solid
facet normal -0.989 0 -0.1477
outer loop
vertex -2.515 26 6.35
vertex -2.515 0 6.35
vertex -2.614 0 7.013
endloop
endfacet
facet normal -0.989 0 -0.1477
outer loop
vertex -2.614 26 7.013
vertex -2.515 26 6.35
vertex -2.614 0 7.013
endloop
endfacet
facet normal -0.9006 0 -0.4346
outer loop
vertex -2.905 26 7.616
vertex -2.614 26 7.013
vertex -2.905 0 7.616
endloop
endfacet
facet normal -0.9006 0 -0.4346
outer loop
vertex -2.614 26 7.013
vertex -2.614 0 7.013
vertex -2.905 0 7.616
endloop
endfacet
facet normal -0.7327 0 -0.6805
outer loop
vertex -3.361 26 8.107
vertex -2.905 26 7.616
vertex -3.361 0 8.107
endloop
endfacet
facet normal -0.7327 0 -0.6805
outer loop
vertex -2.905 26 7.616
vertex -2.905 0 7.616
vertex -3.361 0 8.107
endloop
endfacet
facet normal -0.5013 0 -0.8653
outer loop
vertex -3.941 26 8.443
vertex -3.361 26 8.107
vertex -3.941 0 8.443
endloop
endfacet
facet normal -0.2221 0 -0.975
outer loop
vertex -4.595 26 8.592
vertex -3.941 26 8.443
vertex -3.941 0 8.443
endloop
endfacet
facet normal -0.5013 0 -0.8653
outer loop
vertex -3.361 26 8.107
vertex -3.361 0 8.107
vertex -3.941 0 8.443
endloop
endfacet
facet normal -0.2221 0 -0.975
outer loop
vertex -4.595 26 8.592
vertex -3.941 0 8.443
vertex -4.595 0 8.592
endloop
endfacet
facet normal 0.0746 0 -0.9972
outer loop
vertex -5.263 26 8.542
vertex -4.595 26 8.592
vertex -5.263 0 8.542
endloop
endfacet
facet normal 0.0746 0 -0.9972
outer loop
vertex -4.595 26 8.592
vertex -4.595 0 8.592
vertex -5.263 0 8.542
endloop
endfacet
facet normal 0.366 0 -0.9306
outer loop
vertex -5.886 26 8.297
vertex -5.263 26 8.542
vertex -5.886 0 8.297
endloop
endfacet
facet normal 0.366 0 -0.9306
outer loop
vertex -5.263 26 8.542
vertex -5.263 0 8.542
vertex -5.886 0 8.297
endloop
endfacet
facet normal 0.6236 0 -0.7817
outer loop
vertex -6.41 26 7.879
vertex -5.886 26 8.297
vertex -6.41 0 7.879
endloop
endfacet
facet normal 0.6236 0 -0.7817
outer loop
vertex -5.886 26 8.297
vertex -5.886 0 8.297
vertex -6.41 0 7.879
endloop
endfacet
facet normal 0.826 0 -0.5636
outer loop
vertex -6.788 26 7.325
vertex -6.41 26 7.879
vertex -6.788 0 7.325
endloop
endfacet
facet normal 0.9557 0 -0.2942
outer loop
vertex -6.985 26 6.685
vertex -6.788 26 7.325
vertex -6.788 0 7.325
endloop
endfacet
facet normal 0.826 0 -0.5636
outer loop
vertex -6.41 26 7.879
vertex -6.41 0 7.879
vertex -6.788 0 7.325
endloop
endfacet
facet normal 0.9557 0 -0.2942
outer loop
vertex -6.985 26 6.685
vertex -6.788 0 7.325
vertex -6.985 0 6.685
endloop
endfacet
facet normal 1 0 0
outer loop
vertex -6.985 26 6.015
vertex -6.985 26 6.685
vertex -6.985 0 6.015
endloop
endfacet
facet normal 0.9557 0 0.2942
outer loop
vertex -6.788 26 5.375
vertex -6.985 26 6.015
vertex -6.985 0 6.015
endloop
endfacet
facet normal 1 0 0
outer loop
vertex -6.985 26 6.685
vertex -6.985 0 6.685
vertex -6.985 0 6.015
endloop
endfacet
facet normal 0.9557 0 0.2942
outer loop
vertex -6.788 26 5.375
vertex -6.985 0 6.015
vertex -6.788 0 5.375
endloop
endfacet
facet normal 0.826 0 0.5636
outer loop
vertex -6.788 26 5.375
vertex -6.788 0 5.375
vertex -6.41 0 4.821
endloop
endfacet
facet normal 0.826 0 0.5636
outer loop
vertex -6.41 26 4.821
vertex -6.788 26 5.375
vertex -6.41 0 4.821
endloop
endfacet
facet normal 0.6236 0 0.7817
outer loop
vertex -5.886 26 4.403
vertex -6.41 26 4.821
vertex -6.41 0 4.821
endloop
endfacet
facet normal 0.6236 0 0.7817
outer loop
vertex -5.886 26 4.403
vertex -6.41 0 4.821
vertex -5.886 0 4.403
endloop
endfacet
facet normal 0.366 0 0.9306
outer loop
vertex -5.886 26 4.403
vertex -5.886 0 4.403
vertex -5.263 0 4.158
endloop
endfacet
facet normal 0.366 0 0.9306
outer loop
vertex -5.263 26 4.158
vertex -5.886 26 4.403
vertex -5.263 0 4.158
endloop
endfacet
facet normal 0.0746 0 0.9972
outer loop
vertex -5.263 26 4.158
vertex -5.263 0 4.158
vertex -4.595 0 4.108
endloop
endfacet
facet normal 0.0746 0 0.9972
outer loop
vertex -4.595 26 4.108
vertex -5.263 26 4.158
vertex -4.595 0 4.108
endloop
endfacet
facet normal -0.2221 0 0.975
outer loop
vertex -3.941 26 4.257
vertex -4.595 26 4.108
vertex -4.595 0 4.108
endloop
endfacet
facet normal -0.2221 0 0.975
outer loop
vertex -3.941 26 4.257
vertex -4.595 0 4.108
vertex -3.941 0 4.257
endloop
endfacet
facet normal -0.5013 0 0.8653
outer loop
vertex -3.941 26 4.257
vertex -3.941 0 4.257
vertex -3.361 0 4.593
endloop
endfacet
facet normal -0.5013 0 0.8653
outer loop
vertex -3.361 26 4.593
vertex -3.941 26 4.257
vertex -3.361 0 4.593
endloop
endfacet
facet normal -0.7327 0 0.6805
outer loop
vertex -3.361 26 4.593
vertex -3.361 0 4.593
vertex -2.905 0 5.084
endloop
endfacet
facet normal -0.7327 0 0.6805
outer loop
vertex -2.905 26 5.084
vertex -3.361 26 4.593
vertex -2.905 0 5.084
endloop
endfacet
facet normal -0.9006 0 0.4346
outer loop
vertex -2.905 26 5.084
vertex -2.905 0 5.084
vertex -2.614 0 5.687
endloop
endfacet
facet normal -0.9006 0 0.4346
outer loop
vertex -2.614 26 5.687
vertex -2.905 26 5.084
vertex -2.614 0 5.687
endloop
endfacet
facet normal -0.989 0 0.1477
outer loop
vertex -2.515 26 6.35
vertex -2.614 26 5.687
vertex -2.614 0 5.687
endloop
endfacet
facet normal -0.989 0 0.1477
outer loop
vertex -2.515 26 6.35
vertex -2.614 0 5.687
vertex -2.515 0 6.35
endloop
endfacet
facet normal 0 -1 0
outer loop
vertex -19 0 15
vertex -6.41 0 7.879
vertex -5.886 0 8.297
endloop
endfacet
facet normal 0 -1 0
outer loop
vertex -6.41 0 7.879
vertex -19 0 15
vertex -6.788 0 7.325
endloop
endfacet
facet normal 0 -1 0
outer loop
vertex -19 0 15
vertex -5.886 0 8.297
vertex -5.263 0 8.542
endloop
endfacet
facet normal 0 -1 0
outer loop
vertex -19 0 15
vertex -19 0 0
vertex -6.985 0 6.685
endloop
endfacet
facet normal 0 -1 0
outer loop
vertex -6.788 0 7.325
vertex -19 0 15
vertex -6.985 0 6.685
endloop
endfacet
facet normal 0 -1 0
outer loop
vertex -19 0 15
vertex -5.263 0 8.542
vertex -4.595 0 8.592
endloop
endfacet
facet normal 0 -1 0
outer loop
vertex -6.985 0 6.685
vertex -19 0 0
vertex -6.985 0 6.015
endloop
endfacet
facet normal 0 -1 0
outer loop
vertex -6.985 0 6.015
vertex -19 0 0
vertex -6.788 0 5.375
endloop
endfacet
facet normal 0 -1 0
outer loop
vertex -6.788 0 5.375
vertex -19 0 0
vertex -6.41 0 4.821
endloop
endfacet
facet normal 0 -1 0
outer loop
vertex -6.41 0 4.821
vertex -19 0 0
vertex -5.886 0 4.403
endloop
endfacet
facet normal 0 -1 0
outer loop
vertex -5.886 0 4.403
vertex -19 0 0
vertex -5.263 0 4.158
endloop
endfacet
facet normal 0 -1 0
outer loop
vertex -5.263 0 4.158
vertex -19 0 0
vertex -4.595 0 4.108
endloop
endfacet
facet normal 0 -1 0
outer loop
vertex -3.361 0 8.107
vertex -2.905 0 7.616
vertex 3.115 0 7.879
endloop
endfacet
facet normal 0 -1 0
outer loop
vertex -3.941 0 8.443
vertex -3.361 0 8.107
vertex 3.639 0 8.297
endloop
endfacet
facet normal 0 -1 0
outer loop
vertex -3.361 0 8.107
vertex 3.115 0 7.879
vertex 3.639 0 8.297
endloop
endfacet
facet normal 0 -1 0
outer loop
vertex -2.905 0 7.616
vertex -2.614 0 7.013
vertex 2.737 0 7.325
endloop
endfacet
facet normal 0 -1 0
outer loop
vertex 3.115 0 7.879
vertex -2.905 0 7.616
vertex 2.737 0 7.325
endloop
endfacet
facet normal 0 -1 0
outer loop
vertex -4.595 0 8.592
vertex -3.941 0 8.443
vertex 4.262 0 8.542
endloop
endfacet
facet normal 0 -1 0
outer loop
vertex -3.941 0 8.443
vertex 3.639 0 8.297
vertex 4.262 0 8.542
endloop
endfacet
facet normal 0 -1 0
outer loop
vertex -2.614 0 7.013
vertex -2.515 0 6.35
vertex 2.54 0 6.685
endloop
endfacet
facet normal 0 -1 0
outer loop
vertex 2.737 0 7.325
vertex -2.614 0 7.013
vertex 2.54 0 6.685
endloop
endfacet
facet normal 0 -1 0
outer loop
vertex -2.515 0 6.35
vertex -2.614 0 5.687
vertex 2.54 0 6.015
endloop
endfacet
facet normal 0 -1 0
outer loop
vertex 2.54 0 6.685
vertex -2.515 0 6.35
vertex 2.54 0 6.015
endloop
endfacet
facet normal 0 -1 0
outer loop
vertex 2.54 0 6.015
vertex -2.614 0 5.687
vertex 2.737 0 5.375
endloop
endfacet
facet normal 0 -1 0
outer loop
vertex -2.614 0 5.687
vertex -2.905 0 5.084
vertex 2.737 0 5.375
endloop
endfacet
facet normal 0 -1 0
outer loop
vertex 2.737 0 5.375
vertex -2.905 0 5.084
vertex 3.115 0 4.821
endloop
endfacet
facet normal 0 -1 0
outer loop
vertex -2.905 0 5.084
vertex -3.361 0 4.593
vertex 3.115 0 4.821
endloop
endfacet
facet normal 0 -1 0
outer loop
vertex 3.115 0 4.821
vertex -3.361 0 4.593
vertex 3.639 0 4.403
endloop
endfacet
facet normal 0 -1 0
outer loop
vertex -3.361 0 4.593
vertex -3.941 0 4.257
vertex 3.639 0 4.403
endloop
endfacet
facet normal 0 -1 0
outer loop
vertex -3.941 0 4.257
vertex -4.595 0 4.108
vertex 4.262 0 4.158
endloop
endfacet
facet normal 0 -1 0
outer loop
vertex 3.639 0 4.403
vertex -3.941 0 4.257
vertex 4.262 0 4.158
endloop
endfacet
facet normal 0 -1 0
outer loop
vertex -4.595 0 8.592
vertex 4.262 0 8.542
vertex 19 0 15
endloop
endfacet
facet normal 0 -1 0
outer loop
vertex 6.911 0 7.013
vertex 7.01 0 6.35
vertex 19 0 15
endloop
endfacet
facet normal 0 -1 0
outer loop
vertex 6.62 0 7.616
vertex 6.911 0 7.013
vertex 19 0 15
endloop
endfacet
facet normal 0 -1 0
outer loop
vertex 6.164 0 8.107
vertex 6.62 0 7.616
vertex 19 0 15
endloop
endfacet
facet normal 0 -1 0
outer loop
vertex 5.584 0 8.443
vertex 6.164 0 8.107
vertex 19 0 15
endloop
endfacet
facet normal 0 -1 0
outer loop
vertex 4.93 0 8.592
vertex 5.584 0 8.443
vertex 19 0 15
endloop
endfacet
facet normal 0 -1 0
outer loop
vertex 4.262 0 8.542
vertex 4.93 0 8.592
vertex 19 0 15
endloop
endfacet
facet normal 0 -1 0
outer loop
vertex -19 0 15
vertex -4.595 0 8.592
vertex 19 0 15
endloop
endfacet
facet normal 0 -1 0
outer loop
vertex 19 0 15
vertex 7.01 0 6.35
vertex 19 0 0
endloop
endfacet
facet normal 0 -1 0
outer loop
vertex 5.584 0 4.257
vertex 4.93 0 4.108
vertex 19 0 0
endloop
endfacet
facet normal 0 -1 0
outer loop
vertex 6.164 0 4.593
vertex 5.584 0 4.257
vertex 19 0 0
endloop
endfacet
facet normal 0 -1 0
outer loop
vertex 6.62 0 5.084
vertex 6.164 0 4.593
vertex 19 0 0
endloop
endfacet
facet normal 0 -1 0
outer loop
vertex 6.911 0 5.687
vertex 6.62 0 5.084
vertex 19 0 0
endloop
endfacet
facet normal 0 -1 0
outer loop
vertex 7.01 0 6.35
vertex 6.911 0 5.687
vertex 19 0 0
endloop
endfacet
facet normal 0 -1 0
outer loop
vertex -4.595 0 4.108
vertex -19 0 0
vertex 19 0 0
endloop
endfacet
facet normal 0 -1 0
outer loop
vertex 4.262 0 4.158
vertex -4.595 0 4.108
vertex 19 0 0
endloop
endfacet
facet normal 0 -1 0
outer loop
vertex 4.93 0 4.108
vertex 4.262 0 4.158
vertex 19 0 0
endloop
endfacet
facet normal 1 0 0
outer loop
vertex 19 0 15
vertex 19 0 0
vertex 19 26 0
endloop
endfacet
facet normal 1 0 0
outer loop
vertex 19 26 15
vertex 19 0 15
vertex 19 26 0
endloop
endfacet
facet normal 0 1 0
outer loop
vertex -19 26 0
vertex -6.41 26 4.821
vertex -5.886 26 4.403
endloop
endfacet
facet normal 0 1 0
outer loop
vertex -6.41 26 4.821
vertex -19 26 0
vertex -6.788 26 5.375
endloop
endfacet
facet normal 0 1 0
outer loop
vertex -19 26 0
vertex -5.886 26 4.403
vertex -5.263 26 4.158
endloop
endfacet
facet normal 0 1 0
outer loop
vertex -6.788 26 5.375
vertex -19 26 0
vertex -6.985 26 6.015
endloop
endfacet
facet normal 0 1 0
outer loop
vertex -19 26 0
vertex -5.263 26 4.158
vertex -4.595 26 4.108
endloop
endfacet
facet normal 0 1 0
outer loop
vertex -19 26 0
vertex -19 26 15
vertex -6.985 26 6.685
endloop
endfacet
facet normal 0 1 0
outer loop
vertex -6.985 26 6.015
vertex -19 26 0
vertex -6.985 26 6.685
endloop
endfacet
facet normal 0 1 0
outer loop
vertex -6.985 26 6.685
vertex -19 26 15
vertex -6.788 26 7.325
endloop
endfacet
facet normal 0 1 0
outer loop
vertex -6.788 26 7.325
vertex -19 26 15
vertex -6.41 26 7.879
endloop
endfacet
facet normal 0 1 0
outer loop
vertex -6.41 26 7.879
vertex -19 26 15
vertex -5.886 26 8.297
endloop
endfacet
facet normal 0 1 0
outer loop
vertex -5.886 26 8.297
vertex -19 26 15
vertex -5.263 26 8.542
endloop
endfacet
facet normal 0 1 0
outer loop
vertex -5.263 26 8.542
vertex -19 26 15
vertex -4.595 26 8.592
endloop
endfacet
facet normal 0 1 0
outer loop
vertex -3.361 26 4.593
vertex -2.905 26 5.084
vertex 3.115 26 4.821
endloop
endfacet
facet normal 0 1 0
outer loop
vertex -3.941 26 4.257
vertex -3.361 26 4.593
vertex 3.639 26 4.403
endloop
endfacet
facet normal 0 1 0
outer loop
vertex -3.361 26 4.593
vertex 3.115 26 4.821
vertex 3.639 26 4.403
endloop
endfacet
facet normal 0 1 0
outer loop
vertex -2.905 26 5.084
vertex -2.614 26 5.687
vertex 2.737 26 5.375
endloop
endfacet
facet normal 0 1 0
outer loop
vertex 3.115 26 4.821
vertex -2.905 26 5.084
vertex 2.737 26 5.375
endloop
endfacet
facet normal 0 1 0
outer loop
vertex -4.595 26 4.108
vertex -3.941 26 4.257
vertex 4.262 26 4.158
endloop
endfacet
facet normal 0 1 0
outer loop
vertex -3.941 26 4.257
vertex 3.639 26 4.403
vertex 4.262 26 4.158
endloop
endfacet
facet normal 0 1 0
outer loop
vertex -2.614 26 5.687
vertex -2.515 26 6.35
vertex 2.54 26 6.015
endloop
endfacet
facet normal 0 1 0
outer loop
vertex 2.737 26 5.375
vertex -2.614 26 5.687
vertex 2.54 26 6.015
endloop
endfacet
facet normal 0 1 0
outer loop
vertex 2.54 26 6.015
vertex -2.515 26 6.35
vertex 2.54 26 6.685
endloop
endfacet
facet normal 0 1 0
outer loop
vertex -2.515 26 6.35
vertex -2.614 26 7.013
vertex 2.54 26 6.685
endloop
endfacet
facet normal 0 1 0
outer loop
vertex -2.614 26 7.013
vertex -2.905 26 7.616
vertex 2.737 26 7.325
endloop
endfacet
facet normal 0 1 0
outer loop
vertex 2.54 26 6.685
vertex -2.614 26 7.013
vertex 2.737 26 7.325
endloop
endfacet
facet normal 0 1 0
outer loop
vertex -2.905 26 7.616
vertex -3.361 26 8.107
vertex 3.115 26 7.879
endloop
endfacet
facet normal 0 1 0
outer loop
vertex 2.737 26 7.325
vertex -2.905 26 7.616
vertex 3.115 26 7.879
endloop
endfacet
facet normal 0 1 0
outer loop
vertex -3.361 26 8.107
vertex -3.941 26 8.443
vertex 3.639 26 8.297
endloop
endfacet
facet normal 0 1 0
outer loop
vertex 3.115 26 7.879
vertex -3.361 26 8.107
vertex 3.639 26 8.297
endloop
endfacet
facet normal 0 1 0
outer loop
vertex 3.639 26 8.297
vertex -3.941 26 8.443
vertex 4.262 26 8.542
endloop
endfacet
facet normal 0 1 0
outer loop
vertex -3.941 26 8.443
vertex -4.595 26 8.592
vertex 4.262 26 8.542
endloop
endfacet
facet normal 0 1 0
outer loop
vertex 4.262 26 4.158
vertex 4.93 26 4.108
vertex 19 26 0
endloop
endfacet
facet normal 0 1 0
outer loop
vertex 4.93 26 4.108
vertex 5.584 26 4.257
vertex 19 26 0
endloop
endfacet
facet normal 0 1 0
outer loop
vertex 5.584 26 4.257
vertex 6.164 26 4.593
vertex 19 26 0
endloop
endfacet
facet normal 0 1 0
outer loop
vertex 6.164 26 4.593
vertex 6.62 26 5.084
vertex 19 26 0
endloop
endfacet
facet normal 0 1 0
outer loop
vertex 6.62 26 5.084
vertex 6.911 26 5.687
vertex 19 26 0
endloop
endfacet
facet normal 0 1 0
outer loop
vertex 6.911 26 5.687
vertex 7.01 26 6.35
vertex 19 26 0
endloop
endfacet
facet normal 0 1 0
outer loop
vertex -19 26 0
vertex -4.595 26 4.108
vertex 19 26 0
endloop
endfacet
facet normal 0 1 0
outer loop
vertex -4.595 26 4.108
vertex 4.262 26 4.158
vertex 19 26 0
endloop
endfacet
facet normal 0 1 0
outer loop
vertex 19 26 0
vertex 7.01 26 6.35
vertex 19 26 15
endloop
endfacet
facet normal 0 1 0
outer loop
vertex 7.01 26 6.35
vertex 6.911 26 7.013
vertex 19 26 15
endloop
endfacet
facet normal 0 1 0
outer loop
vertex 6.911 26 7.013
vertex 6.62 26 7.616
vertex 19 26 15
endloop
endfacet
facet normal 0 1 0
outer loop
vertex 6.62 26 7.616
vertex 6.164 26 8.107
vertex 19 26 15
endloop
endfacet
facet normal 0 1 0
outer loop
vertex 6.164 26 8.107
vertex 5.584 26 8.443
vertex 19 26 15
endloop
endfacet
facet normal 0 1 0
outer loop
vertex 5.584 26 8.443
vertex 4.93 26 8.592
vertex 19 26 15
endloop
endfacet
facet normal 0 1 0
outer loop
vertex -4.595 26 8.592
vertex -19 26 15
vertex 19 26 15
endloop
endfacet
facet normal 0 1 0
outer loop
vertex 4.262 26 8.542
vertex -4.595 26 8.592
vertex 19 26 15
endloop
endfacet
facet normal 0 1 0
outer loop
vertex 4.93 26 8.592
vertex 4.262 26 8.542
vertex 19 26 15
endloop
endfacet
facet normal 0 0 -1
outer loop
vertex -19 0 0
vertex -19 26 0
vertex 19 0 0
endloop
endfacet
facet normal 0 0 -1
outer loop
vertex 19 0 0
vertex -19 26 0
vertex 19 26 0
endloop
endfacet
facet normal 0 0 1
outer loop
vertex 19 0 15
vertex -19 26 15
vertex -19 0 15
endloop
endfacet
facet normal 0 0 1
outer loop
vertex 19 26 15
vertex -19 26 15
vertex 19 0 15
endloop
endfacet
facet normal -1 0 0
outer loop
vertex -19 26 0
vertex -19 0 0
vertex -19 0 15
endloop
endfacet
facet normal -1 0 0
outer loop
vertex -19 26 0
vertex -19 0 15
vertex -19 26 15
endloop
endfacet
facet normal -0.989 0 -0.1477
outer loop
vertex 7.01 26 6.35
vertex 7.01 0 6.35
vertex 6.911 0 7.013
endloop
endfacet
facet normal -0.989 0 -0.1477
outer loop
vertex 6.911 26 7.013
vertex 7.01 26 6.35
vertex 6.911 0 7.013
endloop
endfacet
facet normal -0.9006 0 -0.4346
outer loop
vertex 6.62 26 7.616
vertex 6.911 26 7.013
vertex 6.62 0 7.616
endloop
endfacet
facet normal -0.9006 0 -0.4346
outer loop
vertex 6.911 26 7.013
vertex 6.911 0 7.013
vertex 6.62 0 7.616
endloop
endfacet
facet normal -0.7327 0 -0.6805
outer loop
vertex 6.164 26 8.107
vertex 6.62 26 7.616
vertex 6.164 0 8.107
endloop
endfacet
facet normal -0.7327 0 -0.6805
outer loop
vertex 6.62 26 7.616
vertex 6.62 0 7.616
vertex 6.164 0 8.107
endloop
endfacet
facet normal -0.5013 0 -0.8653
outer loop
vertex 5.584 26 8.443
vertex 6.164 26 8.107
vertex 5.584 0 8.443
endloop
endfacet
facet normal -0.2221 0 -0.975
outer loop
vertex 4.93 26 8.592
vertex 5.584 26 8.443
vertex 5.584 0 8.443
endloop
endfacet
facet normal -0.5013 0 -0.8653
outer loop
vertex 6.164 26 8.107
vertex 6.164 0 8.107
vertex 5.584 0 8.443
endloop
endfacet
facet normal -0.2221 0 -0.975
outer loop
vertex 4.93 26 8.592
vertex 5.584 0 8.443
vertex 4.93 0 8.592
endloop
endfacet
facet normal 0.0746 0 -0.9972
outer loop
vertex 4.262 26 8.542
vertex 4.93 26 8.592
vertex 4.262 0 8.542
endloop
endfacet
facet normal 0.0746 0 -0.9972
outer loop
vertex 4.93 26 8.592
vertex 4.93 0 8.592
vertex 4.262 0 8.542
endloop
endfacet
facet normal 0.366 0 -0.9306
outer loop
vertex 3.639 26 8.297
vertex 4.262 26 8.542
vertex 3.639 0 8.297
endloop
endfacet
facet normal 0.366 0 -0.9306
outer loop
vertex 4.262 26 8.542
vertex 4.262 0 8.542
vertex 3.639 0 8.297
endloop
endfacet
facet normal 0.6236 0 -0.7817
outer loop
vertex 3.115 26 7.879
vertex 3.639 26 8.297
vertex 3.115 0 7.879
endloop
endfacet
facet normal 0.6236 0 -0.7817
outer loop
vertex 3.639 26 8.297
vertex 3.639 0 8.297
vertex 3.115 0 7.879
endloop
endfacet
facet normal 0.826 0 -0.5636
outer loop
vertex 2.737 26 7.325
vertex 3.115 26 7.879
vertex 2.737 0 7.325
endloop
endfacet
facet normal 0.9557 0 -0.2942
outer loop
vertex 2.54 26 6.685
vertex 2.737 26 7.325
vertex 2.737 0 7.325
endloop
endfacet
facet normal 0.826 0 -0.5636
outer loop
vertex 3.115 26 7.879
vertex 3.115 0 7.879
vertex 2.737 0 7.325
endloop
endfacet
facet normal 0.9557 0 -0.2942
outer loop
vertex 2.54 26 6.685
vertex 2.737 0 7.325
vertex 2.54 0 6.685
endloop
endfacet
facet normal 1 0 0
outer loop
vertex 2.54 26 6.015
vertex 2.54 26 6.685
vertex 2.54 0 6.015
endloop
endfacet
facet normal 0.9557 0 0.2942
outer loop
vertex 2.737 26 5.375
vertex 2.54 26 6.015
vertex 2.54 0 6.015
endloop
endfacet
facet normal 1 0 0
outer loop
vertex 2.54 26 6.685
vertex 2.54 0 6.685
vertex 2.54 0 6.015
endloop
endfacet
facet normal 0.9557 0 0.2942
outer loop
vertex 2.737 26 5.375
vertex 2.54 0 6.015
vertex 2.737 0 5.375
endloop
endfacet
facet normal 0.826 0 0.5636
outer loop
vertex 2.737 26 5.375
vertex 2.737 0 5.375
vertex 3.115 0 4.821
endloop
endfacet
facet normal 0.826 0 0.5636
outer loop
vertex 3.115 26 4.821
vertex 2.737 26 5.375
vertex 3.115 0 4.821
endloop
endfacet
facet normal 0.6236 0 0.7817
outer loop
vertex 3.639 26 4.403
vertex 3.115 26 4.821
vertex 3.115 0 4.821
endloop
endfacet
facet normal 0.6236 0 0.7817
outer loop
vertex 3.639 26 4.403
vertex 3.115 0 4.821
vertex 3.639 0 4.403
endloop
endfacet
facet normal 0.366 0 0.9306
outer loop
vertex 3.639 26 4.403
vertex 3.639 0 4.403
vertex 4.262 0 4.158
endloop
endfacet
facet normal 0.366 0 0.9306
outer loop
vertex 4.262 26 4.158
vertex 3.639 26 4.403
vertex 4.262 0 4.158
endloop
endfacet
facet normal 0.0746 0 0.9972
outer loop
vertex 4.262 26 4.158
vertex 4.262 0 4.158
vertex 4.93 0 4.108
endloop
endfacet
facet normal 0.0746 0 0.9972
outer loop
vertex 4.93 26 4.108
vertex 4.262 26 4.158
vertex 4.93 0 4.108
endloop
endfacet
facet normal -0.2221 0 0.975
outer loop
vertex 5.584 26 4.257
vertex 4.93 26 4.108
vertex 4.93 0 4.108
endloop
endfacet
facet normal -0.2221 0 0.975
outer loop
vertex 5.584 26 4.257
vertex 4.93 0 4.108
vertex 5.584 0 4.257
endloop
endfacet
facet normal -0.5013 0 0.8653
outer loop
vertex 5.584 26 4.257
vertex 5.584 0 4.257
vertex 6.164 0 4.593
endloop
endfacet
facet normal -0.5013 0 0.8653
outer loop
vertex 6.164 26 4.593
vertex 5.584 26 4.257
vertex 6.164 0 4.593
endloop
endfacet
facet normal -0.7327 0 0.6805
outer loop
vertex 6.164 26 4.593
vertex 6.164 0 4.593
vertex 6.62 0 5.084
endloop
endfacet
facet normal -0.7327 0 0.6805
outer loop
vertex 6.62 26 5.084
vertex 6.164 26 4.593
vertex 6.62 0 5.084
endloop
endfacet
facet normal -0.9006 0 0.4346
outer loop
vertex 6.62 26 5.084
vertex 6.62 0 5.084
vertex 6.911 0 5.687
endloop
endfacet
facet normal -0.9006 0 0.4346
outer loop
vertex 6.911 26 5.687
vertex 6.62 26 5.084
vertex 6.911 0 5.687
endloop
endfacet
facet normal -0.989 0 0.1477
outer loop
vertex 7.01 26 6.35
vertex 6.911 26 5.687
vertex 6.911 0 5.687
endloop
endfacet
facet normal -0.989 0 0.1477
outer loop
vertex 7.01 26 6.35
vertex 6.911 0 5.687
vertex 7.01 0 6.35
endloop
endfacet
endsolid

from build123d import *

# Parameters (mm, degrees)
SKETCH1_W             = 38
SKETCH1_H             = 52
EXTRUDE1_DEPTH        = 15
SKETCH4_W             = 38
SKETCH4_H             = 26
CUT_EXTRUDE3_DEPTH    = 16
F_8_CLEARANCE_HOLE2_D = 4.4958


with BuildPart() as part:
    # Sketch1 → Extrude1 (new body)
    with BuildSketch(Plane.XY):
        with Locations((0, 26)):
            Rectangle(SKETCH1_W, SKETCH1_H)
    extrude(amount=EXTRUDE1_DEPTH)

    # Sketch4 → Cut-Extrude3 (cut, through all)
    with BuildSketch(Plane.XY.offset(15)):
        with Locations((0, 39)):
            Rectangle(SKETCH4_W, SKETCH4_H)
    extrude(amount=-CUT_EXTRUDE3_DEPTH, mode=Mode.SUBTRACT)

    # #8 Clearance Hole2 (through all)
    with Locations(Plane(origin=(0, 26, 0), x_dir=(-1, 0, 0), z_dir=(0, 1, 0))):
        with Locations((-4.7625, 6.35), (4.7625, 6.35)):
            Hole(F_8_CLEARANCE_HOLE2_D / 2)


solid = part.part
